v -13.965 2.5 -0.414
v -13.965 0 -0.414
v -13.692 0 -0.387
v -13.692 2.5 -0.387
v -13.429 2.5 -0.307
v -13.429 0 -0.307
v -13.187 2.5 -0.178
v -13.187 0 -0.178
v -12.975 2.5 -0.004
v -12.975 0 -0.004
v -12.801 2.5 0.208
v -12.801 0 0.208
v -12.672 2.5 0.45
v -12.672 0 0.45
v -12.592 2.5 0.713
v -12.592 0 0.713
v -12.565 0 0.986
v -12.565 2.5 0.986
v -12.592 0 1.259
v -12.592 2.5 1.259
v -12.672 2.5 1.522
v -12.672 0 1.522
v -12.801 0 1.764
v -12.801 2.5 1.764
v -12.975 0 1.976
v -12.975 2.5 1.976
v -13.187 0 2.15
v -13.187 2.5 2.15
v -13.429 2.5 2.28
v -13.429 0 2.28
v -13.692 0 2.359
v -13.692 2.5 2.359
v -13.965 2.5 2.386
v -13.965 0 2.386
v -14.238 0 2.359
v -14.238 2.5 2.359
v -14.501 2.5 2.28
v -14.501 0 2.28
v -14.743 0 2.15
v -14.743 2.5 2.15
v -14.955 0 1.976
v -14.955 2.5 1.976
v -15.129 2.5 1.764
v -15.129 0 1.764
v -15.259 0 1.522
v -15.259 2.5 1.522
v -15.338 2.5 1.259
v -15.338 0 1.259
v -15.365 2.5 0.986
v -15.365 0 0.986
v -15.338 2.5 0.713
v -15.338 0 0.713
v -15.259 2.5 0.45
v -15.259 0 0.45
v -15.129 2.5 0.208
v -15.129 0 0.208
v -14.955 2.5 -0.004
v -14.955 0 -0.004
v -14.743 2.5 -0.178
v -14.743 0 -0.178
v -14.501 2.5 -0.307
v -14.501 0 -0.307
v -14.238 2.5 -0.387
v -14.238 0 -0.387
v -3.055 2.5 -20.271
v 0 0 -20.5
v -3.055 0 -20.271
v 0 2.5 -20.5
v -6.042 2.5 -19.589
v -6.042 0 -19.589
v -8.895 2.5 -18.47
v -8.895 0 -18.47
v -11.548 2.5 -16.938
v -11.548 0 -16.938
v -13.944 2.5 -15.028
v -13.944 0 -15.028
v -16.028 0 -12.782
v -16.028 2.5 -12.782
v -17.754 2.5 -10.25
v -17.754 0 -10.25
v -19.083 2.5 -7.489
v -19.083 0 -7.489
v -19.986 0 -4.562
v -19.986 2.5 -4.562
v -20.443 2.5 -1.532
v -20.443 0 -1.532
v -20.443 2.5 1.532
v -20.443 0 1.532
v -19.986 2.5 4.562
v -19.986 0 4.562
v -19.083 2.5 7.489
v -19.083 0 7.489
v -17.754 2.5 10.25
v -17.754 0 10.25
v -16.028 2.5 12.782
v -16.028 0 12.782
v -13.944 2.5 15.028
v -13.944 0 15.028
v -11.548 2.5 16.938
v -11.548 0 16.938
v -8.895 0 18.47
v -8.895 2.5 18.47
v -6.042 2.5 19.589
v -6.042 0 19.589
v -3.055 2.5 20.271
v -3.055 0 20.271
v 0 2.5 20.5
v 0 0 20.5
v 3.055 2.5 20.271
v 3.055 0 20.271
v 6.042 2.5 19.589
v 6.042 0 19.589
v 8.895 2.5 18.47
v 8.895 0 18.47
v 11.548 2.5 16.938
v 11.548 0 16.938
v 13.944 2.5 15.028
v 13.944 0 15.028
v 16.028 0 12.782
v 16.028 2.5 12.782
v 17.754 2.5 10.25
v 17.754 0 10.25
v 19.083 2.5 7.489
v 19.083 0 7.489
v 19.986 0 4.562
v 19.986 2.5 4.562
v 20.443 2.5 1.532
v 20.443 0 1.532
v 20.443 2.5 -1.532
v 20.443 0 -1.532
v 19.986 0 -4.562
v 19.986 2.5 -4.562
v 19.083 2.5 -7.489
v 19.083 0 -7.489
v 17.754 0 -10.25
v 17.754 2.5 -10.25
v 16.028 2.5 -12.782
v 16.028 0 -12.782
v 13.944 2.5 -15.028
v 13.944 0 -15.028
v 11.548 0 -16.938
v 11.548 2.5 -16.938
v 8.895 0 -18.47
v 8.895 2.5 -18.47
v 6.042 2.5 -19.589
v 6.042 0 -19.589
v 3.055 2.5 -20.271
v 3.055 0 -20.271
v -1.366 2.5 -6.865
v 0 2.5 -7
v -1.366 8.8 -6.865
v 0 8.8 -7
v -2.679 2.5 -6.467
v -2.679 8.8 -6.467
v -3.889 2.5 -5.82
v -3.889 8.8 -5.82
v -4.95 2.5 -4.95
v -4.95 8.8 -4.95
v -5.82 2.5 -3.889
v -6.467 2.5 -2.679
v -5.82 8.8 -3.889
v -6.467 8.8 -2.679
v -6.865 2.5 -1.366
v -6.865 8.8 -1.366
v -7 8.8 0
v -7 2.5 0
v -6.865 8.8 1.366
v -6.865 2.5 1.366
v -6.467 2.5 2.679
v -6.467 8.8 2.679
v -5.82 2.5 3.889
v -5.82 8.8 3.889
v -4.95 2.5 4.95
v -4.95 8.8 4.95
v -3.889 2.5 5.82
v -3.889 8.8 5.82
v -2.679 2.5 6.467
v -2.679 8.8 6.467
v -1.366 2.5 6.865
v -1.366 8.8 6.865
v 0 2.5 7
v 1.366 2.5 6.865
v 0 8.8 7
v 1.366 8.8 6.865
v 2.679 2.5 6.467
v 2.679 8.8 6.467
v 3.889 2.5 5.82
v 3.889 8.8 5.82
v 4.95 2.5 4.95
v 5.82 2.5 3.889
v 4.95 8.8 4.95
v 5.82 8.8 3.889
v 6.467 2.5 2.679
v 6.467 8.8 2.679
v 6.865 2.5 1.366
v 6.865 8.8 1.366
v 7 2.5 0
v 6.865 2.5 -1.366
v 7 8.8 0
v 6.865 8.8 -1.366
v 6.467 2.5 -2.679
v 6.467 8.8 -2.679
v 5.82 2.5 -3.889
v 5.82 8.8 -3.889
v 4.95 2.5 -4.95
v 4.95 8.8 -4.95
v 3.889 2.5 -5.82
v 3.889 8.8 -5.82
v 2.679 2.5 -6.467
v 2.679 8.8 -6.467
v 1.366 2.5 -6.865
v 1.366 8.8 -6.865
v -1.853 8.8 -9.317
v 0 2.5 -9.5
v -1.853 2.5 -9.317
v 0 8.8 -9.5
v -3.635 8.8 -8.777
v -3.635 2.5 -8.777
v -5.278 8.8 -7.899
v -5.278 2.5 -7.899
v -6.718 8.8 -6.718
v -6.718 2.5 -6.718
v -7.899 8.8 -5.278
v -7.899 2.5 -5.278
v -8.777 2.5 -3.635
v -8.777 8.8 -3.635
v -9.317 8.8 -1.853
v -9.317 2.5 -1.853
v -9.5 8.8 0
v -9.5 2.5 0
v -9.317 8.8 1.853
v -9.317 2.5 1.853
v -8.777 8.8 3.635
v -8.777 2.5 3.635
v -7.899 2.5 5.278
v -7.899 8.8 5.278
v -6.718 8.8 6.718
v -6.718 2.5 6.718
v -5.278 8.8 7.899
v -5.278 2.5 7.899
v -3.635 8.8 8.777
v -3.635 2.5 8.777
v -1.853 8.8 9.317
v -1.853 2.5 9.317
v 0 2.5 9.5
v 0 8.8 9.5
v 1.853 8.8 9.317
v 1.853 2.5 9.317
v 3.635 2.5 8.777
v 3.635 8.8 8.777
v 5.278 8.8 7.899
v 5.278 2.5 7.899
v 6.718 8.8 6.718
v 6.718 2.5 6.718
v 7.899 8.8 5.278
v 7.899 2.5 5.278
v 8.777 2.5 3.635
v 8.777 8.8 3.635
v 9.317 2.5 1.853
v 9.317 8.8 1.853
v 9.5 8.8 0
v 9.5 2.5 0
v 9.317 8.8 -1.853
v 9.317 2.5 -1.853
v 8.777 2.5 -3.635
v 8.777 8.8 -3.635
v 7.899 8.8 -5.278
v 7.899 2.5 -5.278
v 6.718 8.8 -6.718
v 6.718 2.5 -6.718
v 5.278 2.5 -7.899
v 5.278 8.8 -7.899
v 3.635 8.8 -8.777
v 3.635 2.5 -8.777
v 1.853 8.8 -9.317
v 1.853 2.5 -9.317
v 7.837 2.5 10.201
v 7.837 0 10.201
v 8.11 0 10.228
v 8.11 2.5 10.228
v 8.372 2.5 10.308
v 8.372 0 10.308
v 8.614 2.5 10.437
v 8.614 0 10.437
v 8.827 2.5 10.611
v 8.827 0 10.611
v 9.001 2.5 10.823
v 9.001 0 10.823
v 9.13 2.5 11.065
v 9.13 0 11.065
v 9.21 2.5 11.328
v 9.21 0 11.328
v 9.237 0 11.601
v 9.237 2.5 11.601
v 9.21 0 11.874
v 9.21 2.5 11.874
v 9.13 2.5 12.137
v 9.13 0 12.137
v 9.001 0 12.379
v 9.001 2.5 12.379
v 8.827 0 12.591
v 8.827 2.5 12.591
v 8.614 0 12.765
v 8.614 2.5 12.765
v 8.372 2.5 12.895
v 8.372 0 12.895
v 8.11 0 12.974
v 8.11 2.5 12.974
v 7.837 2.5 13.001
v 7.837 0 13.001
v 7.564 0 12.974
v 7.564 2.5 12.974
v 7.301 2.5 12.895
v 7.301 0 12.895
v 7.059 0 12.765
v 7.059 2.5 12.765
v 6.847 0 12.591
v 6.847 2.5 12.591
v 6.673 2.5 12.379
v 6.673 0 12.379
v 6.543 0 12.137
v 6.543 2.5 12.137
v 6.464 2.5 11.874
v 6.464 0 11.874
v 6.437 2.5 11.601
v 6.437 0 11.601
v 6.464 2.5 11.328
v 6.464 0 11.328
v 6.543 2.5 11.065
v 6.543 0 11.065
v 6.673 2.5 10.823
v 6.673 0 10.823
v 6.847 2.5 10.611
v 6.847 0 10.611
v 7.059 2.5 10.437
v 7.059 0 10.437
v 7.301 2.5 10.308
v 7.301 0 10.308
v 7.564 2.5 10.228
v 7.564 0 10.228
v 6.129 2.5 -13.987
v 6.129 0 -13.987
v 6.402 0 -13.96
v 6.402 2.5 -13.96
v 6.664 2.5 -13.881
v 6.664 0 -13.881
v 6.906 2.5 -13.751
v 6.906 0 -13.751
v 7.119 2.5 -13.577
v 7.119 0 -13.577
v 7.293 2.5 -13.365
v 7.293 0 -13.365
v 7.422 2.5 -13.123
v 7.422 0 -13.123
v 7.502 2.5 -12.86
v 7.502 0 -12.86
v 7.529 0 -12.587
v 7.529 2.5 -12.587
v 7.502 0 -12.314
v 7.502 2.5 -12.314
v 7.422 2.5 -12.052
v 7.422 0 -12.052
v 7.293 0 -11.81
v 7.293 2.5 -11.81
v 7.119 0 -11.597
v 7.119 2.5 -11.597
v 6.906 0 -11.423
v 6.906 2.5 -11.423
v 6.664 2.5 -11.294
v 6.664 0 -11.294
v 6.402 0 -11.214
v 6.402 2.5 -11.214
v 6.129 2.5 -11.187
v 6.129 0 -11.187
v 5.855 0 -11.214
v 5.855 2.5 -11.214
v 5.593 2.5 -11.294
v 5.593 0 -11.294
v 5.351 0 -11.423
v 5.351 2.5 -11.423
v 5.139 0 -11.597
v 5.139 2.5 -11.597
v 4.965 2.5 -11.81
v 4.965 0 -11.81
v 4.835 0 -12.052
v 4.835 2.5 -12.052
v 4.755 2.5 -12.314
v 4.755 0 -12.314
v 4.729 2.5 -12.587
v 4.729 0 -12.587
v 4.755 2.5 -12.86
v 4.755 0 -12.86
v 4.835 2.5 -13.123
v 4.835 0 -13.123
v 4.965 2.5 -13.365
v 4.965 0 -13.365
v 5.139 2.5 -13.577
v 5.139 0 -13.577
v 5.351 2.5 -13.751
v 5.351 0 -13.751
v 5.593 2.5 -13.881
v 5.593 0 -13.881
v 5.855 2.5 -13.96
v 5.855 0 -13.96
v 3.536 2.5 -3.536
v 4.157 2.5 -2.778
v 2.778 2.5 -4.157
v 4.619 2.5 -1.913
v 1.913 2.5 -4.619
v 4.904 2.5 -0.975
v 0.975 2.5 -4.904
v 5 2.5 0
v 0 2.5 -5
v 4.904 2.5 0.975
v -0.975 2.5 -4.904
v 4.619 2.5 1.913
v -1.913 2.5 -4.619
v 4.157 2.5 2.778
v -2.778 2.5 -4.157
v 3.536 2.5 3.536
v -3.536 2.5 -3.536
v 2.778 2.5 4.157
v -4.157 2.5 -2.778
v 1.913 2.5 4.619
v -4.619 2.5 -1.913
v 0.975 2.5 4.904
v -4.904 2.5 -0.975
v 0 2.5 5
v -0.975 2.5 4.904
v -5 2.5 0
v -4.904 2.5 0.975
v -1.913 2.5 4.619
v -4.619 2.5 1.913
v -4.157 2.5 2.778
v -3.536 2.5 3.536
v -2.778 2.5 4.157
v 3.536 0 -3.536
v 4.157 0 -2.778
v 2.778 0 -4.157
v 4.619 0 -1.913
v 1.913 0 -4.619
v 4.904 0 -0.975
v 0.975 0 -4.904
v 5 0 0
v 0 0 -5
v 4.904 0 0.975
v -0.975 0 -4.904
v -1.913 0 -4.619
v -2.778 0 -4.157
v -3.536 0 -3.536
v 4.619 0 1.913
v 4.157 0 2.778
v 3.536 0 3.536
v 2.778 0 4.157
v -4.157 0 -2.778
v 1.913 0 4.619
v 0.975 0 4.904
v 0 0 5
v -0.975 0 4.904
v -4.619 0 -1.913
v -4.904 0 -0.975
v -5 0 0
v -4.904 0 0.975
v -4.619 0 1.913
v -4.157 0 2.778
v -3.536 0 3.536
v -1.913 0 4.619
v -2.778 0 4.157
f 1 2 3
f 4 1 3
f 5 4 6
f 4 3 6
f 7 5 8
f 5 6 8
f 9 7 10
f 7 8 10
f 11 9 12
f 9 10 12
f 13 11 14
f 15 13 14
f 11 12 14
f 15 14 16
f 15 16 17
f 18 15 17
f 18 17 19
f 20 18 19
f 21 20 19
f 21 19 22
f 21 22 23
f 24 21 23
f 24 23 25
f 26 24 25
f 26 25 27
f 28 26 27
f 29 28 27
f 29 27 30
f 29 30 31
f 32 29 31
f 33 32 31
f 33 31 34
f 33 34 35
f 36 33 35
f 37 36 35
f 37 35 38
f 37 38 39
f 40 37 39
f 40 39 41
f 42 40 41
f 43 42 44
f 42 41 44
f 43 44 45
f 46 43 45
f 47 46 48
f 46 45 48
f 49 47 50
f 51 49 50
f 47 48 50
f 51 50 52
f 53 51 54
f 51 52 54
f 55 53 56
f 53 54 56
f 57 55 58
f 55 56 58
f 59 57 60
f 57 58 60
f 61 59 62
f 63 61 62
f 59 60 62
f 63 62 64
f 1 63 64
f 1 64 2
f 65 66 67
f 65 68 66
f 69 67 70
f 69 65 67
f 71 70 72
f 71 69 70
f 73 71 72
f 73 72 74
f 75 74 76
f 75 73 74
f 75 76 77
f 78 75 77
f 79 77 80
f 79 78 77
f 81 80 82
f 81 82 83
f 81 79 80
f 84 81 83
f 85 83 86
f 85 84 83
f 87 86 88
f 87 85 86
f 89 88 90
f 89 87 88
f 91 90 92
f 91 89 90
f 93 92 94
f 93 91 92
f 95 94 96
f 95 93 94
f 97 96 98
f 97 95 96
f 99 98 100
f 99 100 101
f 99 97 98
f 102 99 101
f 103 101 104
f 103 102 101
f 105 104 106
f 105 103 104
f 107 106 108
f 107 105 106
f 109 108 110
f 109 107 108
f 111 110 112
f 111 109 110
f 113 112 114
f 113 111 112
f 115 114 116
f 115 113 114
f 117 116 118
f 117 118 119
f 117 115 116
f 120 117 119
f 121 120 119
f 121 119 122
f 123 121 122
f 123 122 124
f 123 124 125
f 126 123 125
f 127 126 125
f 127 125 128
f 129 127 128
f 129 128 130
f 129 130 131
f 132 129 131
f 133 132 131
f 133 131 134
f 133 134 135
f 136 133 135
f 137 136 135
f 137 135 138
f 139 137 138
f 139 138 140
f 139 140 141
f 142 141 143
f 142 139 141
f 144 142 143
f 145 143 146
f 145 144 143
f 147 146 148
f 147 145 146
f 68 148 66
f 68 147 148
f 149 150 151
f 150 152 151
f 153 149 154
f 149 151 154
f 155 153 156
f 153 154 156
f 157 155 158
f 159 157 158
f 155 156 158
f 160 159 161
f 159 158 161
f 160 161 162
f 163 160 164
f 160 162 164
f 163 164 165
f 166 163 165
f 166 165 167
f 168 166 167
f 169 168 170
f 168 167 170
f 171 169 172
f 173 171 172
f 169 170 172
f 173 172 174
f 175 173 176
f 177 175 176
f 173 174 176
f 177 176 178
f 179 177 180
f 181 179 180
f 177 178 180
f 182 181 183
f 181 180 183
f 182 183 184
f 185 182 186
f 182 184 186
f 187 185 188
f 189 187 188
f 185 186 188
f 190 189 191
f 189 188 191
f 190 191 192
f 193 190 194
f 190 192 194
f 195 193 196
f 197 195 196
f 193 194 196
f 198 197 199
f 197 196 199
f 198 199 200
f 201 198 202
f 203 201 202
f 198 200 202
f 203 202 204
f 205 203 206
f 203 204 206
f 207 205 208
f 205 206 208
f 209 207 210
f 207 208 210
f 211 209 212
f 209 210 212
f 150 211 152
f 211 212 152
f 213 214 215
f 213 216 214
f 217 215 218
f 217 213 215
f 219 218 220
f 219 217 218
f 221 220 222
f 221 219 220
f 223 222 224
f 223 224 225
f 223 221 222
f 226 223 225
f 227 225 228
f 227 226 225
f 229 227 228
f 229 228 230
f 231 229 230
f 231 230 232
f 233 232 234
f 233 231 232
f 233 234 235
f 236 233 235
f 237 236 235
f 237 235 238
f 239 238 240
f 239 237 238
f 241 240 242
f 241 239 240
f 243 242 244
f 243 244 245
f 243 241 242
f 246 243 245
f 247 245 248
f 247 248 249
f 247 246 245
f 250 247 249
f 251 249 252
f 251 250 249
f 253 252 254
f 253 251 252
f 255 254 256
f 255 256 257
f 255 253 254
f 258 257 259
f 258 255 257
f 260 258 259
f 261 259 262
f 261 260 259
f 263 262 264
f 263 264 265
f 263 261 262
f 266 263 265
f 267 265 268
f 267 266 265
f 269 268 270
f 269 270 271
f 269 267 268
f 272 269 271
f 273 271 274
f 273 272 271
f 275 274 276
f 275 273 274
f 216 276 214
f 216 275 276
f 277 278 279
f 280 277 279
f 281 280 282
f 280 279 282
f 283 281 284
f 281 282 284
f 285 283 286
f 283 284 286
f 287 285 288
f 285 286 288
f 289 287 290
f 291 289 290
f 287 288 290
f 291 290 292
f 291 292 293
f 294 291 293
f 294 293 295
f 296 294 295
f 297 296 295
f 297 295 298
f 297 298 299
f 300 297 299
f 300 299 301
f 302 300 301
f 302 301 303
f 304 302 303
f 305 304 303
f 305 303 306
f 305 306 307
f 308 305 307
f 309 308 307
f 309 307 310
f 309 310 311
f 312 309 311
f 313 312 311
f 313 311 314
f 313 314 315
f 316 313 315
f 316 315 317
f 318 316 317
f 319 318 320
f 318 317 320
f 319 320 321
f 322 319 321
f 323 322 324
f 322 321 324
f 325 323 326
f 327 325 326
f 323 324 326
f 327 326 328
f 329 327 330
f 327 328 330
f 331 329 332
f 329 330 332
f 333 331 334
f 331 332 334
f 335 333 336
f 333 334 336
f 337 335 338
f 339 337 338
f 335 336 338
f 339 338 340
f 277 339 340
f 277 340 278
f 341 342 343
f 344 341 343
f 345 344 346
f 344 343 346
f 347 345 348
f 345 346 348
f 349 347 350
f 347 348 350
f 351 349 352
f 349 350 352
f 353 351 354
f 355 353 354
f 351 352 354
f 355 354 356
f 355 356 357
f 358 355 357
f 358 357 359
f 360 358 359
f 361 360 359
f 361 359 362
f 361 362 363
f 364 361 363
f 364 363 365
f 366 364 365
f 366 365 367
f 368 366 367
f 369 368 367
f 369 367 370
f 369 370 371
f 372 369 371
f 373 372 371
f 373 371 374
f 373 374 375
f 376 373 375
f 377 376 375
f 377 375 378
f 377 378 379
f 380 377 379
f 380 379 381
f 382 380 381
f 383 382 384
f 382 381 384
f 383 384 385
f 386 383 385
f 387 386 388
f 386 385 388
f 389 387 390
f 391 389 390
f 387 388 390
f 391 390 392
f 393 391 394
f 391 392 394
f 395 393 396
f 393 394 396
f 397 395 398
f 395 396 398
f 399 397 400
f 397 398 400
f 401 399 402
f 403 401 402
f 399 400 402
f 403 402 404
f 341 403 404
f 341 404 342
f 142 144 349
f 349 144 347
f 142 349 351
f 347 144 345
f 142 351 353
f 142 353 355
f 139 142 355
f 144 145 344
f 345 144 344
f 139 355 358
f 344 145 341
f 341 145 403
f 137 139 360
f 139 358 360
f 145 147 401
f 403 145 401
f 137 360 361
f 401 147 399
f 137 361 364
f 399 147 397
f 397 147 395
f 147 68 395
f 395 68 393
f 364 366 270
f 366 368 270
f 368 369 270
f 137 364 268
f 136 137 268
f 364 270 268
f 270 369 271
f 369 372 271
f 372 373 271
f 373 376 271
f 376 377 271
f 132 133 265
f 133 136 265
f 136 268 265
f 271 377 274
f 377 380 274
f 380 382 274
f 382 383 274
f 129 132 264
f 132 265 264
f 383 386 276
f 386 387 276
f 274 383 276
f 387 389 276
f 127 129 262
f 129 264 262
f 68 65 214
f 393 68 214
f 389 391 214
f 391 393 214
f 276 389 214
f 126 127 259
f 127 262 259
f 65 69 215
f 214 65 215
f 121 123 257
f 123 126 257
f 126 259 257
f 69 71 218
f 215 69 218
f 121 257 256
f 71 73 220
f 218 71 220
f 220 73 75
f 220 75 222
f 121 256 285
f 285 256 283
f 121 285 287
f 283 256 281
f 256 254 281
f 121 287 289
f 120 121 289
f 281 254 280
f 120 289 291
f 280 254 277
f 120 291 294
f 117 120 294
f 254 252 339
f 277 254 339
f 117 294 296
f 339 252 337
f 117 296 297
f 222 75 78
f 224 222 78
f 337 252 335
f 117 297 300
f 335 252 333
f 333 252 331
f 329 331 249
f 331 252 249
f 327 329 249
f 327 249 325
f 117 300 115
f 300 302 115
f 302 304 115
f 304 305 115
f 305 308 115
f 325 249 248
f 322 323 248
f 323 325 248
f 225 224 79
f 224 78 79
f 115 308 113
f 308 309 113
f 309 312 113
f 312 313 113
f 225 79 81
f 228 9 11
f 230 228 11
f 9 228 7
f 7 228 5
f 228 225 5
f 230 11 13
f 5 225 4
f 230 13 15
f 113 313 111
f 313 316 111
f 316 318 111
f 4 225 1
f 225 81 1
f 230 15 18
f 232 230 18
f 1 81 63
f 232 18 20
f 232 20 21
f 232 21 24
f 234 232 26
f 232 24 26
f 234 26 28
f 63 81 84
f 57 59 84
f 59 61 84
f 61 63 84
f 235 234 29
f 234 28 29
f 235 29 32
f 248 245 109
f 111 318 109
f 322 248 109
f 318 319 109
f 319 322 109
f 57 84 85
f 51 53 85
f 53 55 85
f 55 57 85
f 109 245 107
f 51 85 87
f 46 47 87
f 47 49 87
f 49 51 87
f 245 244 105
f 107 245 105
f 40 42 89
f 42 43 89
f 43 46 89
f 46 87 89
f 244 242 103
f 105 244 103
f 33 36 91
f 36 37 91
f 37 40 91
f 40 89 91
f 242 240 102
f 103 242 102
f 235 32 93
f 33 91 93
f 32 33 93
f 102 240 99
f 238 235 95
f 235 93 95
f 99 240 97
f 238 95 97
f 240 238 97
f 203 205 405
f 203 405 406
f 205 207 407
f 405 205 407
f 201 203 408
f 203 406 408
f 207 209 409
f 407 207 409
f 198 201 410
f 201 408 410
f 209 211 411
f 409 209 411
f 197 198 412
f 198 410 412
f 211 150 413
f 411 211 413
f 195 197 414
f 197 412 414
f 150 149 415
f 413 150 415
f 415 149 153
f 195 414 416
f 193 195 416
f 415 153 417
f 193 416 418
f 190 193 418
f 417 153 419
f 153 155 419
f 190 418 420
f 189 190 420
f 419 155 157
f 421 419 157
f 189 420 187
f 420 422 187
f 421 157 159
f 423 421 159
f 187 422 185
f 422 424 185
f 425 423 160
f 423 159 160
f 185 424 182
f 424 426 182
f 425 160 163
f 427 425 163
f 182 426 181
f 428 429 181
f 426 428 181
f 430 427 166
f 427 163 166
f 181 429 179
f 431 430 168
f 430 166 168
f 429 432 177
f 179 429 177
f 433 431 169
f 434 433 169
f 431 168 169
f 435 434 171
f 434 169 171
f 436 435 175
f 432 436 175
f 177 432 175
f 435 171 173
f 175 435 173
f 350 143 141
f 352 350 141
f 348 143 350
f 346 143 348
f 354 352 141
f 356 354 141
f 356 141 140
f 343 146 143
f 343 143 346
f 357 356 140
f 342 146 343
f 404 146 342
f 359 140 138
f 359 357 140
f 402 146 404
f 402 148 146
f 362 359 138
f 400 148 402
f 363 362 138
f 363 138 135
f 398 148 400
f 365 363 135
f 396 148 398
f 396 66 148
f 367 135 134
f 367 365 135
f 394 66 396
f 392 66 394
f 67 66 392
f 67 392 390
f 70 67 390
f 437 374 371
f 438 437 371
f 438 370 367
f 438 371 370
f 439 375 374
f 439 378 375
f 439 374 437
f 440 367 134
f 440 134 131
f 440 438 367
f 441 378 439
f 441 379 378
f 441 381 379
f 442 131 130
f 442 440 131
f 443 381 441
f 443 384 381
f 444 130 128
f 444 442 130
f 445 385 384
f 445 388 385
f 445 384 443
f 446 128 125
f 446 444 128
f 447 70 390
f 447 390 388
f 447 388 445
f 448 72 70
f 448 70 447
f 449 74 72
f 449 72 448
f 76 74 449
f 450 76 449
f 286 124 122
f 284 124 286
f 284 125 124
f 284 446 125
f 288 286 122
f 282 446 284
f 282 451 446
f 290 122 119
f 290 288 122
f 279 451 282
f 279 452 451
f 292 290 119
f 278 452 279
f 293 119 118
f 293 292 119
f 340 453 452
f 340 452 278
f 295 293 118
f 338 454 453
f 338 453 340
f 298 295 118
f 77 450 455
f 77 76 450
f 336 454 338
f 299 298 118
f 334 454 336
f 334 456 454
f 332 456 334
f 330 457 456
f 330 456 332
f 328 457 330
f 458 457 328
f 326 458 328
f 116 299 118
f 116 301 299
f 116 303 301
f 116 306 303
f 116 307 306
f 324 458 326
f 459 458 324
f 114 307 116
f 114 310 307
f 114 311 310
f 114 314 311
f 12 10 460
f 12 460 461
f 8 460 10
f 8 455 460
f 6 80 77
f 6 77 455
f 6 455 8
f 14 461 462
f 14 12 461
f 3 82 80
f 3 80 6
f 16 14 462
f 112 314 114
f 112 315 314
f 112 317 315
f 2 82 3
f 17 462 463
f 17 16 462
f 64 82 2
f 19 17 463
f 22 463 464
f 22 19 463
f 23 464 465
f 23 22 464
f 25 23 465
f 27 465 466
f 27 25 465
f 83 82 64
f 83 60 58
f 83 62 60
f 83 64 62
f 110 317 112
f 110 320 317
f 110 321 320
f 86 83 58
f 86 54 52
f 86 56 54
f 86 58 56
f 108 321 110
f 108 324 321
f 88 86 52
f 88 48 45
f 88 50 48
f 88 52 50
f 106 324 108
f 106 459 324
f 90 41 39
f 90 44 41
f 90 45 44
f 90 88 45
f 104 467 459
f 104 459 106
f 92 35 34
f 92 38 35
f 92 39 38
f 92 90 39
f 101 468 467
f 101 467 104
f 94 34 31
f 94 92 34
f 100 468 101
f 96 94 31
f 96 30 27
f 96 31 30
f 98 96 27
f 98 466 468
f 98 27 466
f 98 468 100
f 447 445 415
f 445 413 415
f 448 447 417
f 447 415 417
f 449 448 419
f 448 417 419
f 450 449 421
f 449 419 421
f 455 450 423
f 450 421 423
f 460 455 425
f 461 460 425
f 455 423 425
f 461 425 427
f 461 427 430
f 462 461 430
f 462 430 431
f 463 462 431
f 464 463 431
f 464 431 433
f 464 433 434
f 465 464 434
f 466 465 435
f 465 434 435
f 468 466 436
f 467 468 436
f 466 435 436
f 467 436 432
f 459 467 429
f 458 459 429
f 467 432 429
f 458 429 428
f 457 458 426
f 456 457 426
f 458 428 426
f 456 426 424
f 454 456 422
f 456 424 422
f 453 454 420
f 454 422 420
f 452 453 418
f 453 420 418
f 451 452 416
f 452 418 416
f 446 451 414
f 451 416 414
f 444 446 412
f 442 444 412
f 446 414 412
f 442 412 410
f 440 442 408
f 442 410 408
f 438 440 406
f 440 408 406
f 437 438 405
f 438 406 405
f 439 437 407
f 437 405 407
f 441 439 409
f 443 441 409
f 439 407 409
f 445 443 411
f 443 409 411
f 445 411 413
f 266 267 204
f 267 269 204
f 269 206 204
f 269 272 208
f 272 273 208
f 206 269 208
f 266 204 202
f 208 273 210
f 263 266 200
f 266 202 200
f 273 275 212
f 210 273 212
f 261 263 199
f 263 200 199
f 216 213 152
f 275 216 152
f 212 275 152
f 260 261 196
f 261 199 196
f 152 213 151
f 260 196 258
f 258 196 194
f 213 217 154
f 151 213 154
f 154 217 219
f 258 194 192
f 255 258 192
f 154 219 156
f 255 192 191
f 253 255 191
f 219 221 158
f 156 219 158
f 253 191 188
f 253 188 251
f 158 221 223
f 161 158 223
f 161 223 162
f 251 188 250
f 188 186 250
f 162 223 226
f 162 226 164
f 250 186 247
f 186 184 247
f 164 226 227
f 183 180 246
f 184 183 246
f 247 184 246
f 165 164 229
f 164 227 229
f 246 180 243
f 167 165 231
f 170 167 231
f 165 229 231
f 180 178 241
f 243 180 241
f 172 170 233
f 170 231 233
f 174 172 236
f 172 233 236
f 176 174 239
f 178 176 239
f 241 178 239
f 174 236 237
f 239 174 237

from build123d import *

# Parameters (mm, degrees)
ESQUISSE1_W      = 15.5
ESQUISSE1_H      = 2.5
ESQUISSE1_W_2    = 2.5
ESQUISSE1_H_2    = 6.3
ESQUISSE2_R      = 1.4
EXTRUSION1_DEPTH = 10


with BuildPart() as part:
    # Esquisse1 → Révolution1 (revolve)
    with BuildSketch(Plane.XY, mode=Mode.PRIVATE) as r_volution1_sk:
        with Locations((12.75, 1.25)):
            Rectangle(ESQUISSE1_W, ESQUISSE1_H)
        with Locations((8.25, 5.65)):
            Rectangle(ESQUISSE1_W_2, ESQUISSE1_H_2)
    revolve(r_volution1_sk.sketch.rotate(Axis((0, 0, 0), (0, 1, 0)), 90), axis=Axis((0, 0, 0), (0, 1, 0)))

    # Esquisse2 → Extrusion1 (cut)
    with BuildSketch(Plane.XZ):
        with Locations(Location((-13.965223749, 0.986167141, 0), (0, 0, 270))):
            Circle(ESQUISSE2_R)
        with Locations(Location((7.836657671, 11.601154966, 0), (0, 0, 270))):
            Circle(ESQUISSE2_R)
        with Locations(Location((6.128566078, -12.587322107, 0), (0, 0, 270))):
            Circle(ESQUISSE2_R)
    extrude(amount=-EXTRUSION1_DEPTH, mode=Mode.SUBTRACT)


solid = part.part
